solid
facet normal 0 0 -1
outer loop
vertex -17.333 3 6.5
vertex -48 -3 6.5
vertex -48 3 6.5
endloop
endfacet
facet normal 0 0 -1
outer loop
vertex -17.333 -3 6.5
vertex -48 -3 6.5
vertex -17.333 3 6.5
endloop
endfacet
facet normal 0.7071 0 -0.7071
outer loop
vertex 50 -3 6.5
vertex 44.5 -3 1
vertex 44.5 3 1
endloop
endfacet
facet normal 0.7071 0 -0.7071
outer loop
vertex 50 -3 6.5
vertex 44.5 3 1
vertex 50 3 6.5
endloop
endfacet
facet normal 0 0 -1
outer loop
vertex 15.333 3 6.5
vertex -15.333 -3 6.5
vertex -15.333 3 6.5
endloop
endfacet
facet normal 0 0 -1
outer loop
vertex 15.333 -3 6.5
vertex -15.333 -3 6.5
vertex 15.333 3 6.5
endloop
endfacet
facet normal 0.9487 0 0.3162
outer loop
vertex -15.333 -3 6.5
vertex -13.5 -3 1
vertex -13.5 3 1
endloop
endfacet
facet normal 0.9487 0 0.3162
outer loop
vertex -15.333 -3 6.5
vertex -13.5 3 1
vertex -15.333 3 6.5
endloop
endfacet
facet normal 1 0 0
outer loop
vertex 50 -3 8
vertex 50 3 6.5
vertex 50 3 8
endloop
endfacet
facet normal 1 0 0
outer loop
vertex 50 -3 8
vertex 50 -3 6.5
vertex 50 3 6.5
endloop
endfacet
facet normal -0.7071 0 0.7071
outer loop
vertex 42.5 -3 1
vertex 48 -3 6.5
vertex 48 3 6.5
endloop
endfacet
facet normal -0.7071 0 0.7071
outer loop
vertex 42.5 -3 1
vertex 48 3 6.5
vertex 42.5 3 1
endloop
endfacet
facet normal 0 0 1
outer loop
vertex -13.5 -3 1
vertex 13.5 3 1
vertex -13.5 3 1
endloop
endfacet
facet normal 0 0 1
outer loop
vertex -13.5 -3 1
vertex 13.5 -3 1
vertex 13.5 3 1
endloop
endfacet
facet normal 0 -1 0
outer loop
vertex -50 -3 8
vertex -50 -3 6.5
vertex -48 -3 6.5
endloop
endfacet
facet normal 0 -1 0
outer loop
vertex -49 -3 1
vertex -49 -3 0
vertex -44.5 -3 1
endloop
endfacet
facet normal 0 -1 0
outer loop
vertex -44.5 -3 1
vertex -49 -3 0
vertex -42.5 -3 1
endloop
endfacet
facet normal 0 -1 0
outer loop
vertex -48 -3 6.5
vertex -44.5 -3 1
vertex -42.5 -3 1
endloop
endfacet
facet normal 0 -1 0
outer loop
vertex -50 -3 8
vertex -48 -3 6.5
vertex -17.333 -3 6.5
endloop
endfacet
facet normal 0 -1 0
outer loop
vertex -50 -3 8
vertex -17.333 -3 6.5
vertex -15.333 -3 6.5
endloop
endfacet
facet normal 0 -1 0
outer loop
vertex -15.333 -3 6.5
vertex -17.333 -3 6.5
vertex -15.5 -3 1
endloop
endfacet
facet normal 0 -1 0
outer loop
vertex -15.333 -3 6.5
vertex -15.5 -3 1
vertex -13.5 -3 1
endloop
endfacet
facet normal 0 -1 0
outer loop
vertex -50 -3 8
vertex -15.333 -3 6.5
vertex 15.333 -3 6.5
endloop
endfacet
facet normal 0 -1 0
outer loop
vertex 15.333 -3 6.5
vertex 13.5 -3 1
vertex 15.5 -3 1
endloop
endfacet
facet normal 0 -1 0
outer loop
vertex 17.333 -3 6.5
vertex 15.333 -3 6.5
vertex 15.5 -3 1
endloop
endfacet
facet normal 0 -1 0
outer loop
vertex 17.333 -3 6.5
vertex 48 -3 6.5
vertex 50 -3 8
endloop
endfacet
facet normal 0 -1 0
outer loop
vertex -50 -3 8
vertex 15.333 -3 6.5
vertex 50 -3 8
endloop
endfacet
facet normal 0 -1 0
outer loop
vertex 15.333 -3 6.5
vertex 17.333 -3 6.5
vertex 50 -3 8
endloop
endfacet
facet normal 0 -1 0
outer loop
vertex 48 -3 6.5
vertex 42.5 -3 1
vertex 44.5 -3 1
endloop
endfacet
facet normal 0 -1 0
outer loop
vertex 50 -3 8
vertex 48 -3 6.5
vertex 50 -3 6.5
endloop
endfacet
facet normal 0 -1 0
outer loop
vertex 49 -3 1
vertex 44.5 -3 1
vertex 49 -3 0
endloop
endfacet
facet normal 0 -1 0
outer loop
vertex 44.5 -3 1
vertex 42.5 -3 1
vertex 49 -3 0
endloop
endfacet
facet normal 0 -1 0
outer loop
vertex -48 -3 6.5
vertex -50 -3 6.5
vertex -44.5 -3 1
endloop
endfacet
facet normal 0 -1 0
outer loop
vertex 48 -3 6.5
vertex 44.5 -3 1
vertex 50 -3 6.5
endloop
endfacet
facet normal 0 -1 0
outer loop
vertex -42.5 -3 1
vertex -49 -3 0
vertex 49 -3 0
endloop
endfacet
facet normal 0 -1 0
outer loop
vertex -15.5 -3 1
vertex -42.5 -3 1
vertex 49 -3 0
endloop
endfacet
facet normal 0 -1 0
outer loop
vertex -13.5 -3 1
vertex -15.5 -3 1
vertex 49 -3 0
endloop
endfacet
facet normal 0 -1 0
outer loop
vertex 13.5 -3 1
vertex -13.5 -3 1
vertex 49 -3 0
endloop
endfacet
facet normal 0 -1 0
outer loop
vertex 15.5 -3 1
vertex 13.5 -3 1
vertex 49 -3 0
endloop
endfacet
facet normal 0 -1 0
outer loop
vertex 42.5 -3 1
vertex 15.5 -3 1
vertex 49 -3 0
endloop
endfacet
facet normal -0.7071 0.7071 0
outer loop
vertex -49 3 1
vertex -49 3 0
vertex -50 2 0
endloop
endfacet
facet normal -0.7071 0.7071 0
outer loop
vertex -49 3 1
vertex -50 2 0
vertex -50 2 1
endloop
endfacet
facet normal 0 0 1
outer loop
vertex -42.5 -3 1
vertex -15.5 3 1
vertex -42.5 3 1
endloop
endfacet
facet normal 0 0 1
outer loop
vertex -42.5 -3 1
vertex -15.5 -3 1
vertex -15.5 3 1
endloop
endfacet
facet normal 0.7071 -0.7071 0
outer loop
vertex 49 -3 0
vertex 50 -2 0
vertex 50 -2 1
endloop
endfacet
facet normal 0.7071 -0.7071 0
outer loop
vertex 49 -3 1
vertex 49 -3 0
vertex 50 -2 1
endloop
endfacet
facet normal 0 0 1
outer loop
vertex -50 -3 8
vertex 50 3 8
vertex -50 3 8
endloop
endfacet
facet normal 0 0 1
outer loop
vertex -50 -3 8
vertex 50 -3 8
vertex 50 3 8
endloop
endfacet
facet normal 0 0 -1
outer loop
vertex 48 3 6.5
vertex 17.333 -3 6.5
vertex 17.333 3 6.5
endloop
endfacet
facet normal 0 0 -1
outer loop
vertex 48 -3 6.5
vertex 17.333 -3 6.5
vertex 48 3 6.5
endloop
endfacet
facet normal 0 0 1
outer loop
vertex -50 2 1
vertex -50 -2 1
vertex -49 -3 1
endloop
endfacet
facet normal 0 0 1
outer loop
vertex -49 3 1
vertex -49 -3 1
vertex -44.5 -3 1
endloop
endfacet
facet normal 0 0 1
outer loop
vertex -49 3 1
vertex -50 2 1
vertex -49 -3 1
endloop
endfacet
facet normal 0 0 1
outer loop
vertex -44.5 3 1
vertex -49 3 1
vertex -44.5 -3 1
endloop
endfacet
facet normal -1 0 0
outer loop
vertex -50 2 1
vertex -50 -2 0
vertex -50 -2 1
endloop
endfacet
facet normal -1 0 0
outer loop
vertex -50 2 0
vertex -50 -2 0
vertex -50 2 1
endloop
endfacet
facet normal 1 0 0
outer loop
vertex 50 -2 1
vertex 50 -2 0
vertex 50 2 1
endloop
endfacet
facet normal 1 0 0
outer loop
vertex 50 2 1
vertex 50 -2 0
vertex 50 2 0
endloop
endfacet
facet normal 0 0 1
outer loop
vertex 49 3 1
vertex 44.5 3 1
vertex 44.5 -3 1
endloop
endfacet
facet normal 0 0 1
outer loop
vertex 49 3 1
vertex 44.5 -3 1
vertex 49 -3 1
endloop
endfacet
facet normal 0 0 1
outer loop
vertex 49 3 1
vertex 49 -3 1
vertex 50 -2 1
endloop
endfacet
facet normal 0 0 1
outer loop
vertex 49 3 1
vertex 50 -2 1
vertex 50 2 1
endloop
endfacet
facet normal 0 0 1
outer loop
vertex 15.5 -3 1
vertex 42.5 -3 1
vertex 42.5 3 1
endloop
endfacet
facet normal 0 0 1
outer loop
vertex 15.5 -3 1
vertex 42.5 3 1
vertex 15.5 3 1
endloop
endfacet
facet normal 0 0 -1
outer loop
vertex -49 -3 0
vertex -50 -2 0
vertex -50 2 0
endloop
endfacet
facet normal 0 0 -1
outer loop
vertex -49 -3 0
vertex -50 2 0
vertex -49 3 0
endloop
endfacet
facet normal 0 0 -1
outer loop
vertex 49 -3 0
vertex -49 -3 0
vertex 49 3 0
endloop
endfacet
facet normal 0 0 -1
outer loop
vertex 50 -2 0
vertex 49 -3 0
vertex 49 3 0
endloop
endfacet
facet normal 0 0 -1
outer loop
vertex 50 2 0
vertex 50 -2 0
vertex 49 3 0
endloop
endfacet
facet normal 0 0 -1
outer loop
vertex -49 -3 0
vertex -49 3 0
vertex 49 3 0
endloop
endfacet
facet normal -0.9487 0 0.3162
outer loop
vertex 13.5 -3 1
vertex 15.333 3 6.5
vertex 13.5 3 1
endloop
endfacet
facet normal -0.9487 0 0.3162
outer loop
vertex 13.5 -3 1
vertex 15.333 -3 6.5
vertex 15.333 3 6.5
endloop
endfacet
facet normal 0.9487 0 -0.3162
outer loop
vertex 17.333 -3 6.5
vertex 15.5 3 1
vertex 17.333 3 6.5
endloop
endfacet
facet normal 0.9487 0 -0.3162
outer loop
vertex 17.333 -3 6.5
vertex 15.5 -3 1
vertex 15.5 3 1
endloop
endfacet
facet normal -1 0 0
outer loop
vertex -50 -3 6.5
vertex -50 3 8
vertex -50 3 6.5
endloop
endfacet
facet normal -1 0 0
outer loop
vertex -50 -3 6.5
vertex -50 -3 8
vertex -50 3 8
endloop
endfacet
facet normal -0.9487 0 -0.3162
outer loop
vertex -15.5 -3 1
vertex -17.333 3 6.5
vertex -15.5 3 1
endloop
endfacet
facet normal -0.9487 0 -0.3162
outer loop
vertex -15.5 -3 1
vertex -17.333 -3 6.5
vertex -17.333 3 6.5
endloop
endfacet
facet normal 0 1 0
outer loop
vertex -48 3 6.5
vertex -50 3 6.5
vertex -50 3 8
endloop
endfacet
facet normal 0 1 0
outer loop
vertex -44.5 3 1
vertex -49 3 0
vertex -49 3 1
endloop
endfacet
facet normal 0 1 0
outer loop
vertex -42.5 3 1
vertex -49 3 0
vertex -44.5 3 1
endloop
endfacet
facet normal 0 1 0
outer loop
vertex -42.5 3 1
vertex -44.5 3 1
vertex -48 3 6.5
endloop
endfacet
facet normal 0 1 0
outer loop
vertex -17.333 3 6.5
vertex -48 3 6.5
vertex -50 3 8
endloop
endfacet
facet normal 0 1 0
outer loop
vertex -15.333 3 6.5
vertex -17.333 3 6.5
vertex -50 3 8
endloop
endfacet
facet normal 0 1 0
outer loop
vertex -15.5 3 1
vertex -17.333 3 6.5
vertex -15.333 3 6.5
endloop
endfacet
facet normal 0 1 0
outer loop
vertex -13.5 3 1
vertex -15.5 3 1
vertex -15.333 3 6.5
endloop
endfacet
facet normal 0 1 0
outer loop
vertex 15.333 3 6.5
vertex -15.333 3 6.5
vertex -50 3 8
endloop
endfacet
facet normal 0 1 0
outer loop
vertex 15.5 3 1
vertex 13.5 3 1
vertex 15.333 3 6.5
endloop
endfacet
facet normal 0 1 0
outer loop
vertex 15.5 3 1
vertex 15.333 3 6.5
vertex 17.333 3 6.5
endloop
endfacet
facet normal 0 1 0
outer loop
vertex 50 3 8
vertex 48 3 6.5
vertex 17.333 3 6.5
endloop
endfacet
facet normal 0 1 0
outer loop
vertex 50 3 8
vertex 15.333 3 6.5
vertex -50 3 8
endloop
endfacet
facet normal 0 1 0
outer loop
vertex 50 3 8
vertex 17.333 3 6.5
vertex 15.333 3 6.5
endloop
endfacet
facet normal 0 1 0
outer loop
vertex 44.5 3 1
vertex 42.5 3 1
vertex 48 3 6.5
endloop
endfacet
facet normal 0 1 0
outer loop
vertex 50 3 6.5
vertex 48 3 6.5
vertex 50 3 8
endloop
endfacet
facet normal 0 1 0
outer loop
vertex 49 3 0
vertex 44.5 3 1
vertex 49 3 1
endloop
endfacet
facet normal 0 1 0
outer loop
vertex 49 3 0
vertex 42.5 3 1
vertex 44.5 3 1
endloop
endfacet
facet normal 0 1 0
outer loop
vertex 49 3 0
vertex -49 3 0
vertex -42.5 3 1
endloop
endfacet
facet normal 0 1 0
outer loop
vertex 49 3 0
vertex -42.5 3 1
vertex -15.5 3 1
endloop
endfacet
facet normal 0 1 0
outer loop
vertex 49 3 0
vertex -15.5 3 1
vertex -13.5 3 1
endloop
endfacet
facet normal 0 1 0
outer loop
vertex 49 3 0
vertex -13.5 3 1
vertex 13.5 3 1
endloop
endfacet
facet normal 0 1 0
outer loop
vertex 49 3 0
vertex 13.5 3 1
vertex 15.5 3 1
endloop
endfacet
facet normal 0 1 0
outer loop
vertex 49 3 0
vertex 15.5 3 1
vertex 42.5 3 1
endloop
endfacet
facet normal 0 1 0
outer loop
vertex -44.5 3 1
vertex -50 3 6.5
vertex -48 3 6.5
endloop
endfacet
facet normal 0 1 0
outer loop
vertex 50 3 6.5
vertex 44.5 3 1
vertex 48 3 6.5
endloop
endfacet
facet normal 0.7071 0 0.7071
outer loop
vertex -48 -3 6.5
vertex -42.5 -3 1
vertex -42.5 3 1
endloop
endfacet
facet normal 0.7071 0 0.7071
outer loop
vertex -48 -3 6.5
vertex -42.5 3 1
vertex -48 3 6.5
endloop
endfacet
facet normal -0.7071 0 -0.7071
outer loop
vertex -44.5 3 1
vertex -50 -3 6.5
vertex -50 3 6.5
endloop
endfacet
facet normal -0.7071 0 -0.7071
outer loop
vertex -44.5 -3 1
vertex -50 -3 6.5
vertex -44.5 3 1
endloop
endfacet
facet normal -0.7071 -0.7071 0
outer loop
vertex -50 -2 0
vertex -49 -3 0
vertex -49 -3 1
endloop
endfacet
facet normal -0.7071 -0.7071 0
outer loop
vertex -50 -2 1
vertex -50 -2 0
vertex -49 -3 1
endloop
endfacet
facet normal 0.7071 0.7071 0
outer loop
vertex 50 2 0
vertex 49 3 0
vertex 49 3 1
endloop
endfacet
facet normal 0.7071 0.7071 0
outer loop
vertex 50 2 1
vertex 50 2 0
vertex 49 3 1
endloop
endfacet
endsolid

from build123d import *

# Parameters (mm, degrees)
SKETCH_W     = 100
SKETCH_H     = 6
PAD_DEPTH    = 1
CHAMFER_SIZE = 1
PAD001_DEPTH = 3


with BuildPart() as chamfer_body:
    # Sketch → Pad (new body)
    with BuildSketch(Plane.XY):
        Rectangle(SKETCH_W, SKETCH_H)
    extrude(amount=PAD_DEPTH)

    # Chamfer
    chamfer_edges = [chamfer_body.edges().sort_by_distance(p)[0] for p in [
        (-50, 3, 0.5),
        (-50, -3, 0.5),
        (50, 3, 0.5),
        (50, -3, 0.5),
    ]]
    chamfer(chamfer_edges, length=CHAMFER_SIZE)


with BuildPart() as fusion:
    # Sketch001 → Pad001 (new body, symmetric)
    with BuildSketch(Plane.XZ):
        Polygon((-50, 8), (-50, 6.5), (-43.5, 0), (43.5, 0), (50, 6.5), (50, 8), align=None)
        Polygon((-42.5, 1), (-48, 6.5), (-17.333333, 6.5), (-15.5, 1), align=None, mode=Mode.SUBTRACT)
        Polygon((48, 6.5), (42.5, 1), (15.5, 1), (17.333333, 6.5), align=None, mode=Mode.SUBTRACT)
        Polygon((-13.5, 1), (-15.333333, 6.5), (15.333333, 6.5), (13.5, 1), align=None, mode=Mode.SUBTRACT)
    extrude(amount=PAD001_DEPTH, both=True)

    # Fusion: union Chamfer body
    add(chamfer_body.part)


solid = fusion.part
